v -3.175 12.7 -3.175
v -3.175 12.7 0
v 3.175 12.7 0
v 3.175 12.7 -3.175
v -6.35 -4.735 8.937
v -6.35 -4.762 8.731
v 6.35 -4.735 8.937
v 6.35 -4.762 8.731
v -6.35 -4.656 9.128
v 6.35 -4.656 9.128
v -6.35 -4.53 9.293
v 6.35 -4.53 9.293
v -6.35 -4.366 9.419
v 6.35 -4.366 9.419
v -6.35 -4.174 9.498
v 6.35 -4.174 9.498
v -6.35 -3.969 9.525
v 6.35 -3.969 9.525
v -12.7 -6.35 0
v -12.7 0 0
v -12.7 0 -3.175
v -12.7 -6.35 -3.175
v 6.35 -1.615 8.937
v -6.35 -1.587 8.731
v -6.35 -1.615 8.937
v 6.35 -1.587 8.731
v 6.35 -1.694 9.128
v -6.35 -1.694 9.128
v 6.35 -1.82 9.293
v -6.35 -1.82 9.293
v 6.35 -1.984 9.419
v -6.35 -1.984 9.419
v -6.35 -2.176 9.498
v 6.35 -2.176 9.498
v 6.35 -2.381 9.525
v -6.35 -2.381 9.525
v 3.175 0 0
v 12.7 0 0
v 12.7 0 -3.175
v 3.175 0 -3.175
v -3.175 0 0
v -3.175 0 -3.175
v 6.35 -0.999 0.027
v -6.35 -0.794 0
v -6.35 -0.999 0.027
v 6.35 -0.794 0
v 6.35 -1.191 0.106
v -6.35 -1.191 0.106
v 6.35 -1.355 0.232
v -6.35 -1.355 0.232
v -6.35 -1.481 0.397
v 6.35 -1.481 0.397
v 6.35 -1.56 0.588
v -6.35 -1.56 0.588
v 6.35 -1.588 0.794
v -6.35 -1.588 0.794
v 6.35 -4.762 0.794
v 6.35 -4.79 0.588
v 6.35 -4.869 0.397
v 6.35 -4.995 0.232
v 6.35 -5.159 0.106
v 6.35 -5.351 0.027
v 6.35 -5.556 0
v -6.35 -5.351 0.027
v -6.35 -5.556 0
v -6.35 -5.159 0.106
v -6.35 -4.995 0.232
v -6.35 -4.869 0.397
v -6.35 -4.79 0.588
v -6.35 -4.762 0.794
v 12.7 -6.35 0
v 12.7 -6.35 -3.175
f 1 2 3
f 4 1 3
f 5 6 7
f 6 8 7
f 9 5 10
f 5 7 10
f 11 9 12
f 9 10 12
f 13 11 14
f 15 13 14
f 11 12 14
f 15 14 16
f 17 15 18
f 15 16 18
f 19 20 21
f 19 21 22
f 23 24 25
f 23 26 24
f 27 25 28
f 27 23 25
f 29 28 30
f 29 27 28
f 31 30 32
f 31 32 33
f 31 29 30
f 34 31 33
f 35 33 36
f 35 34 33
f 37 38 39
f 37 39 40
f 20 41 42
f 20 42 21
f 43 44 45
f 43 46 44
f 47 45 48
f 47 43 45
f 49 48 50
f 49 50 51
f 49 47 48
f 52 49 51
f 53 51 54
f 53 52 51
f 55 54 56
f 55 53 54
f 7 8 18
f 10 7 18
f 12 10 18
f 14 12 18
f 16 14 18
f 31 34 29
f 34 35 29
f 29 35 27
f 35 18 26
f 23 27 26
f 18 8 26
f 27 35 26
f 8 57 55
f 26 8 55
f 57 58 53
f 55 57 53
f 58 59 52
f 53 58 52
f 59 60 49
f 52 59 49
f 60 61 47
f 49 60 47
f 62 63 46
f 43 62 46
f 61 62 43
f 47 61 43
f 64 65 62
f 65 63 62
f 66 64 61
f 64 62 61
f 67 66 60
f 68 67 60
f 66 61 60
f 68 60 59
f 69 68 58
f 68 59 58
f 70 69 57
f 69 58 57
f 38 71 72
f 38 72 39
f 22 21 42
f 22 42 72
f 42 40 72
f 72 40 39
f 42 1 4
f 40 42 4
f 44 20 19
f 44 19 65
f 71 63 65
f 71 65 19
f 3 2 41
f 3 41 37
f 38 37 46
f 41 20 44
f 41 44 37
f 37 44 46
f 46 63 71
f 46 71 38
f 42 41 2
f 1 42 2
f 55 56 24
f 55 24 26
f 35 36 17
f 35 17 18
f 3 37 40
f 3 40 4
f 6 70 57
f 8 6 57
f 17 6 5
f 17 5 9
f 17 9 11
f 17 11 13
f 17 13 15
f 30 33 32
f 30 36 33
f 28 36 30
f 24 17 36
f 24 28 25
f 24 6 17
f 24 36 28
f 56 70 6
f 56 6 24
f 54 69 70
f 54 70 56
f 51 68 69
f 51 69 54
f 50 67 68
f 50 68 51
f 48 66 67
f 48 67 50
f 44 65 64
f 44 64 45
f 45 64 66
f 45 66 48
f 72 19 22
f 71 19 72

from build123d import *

# Parameters (mm, degrees)
F0_W     = 12.7
F0_H     = 3.175
F0_W_2   = 6.35
F0_H_2   = 12.7
F1_DEPTH = 3.175
F2_DEPTH = 9.525
F3_R     = 0.79375


with BuildPart() as f1:
    # F0 (on Top) → F1 (new body)
    with BuildSketch(Plane.XY):
        Polygon((-3.175, 0), (-12.7, 0), (-12.7, -6.35), (12.7, -6.35), (12.7, 0), (3.175, 0), align=None)
        with Locations((0, -3.175)):
            Rectangle(F0_W, F0_H, mode=Mode.SUBTRACT)
        with Locations((0, -3.175)):
            Rectangle(F0_W, F0_H)
        with Locations((0, 6.35)):
            Rectangle(F0_W_2, F0_H_2)
    extrude(amount=-F1_DEPTH)

    # F0 (on Top) → F2 (join)
    with BuildSketch(Plane.XY):
        with Locations((0, -3.175)):
            Rectangle(F0_W, F0_H)
    extrude(amount=F2_DEPTH)

    # F3
    f3_edges = [f1.edges().sort_by_distance(p)[0] for p in [
        (0, -4.7625, 9.525),
        (0, -1.5875, 9.525),
        (0, -1.5875, 0),
        (0, -4.7625, 0),
    ]]
    fillet(f3_edges, radius=F3_R)


solid = f1.part
